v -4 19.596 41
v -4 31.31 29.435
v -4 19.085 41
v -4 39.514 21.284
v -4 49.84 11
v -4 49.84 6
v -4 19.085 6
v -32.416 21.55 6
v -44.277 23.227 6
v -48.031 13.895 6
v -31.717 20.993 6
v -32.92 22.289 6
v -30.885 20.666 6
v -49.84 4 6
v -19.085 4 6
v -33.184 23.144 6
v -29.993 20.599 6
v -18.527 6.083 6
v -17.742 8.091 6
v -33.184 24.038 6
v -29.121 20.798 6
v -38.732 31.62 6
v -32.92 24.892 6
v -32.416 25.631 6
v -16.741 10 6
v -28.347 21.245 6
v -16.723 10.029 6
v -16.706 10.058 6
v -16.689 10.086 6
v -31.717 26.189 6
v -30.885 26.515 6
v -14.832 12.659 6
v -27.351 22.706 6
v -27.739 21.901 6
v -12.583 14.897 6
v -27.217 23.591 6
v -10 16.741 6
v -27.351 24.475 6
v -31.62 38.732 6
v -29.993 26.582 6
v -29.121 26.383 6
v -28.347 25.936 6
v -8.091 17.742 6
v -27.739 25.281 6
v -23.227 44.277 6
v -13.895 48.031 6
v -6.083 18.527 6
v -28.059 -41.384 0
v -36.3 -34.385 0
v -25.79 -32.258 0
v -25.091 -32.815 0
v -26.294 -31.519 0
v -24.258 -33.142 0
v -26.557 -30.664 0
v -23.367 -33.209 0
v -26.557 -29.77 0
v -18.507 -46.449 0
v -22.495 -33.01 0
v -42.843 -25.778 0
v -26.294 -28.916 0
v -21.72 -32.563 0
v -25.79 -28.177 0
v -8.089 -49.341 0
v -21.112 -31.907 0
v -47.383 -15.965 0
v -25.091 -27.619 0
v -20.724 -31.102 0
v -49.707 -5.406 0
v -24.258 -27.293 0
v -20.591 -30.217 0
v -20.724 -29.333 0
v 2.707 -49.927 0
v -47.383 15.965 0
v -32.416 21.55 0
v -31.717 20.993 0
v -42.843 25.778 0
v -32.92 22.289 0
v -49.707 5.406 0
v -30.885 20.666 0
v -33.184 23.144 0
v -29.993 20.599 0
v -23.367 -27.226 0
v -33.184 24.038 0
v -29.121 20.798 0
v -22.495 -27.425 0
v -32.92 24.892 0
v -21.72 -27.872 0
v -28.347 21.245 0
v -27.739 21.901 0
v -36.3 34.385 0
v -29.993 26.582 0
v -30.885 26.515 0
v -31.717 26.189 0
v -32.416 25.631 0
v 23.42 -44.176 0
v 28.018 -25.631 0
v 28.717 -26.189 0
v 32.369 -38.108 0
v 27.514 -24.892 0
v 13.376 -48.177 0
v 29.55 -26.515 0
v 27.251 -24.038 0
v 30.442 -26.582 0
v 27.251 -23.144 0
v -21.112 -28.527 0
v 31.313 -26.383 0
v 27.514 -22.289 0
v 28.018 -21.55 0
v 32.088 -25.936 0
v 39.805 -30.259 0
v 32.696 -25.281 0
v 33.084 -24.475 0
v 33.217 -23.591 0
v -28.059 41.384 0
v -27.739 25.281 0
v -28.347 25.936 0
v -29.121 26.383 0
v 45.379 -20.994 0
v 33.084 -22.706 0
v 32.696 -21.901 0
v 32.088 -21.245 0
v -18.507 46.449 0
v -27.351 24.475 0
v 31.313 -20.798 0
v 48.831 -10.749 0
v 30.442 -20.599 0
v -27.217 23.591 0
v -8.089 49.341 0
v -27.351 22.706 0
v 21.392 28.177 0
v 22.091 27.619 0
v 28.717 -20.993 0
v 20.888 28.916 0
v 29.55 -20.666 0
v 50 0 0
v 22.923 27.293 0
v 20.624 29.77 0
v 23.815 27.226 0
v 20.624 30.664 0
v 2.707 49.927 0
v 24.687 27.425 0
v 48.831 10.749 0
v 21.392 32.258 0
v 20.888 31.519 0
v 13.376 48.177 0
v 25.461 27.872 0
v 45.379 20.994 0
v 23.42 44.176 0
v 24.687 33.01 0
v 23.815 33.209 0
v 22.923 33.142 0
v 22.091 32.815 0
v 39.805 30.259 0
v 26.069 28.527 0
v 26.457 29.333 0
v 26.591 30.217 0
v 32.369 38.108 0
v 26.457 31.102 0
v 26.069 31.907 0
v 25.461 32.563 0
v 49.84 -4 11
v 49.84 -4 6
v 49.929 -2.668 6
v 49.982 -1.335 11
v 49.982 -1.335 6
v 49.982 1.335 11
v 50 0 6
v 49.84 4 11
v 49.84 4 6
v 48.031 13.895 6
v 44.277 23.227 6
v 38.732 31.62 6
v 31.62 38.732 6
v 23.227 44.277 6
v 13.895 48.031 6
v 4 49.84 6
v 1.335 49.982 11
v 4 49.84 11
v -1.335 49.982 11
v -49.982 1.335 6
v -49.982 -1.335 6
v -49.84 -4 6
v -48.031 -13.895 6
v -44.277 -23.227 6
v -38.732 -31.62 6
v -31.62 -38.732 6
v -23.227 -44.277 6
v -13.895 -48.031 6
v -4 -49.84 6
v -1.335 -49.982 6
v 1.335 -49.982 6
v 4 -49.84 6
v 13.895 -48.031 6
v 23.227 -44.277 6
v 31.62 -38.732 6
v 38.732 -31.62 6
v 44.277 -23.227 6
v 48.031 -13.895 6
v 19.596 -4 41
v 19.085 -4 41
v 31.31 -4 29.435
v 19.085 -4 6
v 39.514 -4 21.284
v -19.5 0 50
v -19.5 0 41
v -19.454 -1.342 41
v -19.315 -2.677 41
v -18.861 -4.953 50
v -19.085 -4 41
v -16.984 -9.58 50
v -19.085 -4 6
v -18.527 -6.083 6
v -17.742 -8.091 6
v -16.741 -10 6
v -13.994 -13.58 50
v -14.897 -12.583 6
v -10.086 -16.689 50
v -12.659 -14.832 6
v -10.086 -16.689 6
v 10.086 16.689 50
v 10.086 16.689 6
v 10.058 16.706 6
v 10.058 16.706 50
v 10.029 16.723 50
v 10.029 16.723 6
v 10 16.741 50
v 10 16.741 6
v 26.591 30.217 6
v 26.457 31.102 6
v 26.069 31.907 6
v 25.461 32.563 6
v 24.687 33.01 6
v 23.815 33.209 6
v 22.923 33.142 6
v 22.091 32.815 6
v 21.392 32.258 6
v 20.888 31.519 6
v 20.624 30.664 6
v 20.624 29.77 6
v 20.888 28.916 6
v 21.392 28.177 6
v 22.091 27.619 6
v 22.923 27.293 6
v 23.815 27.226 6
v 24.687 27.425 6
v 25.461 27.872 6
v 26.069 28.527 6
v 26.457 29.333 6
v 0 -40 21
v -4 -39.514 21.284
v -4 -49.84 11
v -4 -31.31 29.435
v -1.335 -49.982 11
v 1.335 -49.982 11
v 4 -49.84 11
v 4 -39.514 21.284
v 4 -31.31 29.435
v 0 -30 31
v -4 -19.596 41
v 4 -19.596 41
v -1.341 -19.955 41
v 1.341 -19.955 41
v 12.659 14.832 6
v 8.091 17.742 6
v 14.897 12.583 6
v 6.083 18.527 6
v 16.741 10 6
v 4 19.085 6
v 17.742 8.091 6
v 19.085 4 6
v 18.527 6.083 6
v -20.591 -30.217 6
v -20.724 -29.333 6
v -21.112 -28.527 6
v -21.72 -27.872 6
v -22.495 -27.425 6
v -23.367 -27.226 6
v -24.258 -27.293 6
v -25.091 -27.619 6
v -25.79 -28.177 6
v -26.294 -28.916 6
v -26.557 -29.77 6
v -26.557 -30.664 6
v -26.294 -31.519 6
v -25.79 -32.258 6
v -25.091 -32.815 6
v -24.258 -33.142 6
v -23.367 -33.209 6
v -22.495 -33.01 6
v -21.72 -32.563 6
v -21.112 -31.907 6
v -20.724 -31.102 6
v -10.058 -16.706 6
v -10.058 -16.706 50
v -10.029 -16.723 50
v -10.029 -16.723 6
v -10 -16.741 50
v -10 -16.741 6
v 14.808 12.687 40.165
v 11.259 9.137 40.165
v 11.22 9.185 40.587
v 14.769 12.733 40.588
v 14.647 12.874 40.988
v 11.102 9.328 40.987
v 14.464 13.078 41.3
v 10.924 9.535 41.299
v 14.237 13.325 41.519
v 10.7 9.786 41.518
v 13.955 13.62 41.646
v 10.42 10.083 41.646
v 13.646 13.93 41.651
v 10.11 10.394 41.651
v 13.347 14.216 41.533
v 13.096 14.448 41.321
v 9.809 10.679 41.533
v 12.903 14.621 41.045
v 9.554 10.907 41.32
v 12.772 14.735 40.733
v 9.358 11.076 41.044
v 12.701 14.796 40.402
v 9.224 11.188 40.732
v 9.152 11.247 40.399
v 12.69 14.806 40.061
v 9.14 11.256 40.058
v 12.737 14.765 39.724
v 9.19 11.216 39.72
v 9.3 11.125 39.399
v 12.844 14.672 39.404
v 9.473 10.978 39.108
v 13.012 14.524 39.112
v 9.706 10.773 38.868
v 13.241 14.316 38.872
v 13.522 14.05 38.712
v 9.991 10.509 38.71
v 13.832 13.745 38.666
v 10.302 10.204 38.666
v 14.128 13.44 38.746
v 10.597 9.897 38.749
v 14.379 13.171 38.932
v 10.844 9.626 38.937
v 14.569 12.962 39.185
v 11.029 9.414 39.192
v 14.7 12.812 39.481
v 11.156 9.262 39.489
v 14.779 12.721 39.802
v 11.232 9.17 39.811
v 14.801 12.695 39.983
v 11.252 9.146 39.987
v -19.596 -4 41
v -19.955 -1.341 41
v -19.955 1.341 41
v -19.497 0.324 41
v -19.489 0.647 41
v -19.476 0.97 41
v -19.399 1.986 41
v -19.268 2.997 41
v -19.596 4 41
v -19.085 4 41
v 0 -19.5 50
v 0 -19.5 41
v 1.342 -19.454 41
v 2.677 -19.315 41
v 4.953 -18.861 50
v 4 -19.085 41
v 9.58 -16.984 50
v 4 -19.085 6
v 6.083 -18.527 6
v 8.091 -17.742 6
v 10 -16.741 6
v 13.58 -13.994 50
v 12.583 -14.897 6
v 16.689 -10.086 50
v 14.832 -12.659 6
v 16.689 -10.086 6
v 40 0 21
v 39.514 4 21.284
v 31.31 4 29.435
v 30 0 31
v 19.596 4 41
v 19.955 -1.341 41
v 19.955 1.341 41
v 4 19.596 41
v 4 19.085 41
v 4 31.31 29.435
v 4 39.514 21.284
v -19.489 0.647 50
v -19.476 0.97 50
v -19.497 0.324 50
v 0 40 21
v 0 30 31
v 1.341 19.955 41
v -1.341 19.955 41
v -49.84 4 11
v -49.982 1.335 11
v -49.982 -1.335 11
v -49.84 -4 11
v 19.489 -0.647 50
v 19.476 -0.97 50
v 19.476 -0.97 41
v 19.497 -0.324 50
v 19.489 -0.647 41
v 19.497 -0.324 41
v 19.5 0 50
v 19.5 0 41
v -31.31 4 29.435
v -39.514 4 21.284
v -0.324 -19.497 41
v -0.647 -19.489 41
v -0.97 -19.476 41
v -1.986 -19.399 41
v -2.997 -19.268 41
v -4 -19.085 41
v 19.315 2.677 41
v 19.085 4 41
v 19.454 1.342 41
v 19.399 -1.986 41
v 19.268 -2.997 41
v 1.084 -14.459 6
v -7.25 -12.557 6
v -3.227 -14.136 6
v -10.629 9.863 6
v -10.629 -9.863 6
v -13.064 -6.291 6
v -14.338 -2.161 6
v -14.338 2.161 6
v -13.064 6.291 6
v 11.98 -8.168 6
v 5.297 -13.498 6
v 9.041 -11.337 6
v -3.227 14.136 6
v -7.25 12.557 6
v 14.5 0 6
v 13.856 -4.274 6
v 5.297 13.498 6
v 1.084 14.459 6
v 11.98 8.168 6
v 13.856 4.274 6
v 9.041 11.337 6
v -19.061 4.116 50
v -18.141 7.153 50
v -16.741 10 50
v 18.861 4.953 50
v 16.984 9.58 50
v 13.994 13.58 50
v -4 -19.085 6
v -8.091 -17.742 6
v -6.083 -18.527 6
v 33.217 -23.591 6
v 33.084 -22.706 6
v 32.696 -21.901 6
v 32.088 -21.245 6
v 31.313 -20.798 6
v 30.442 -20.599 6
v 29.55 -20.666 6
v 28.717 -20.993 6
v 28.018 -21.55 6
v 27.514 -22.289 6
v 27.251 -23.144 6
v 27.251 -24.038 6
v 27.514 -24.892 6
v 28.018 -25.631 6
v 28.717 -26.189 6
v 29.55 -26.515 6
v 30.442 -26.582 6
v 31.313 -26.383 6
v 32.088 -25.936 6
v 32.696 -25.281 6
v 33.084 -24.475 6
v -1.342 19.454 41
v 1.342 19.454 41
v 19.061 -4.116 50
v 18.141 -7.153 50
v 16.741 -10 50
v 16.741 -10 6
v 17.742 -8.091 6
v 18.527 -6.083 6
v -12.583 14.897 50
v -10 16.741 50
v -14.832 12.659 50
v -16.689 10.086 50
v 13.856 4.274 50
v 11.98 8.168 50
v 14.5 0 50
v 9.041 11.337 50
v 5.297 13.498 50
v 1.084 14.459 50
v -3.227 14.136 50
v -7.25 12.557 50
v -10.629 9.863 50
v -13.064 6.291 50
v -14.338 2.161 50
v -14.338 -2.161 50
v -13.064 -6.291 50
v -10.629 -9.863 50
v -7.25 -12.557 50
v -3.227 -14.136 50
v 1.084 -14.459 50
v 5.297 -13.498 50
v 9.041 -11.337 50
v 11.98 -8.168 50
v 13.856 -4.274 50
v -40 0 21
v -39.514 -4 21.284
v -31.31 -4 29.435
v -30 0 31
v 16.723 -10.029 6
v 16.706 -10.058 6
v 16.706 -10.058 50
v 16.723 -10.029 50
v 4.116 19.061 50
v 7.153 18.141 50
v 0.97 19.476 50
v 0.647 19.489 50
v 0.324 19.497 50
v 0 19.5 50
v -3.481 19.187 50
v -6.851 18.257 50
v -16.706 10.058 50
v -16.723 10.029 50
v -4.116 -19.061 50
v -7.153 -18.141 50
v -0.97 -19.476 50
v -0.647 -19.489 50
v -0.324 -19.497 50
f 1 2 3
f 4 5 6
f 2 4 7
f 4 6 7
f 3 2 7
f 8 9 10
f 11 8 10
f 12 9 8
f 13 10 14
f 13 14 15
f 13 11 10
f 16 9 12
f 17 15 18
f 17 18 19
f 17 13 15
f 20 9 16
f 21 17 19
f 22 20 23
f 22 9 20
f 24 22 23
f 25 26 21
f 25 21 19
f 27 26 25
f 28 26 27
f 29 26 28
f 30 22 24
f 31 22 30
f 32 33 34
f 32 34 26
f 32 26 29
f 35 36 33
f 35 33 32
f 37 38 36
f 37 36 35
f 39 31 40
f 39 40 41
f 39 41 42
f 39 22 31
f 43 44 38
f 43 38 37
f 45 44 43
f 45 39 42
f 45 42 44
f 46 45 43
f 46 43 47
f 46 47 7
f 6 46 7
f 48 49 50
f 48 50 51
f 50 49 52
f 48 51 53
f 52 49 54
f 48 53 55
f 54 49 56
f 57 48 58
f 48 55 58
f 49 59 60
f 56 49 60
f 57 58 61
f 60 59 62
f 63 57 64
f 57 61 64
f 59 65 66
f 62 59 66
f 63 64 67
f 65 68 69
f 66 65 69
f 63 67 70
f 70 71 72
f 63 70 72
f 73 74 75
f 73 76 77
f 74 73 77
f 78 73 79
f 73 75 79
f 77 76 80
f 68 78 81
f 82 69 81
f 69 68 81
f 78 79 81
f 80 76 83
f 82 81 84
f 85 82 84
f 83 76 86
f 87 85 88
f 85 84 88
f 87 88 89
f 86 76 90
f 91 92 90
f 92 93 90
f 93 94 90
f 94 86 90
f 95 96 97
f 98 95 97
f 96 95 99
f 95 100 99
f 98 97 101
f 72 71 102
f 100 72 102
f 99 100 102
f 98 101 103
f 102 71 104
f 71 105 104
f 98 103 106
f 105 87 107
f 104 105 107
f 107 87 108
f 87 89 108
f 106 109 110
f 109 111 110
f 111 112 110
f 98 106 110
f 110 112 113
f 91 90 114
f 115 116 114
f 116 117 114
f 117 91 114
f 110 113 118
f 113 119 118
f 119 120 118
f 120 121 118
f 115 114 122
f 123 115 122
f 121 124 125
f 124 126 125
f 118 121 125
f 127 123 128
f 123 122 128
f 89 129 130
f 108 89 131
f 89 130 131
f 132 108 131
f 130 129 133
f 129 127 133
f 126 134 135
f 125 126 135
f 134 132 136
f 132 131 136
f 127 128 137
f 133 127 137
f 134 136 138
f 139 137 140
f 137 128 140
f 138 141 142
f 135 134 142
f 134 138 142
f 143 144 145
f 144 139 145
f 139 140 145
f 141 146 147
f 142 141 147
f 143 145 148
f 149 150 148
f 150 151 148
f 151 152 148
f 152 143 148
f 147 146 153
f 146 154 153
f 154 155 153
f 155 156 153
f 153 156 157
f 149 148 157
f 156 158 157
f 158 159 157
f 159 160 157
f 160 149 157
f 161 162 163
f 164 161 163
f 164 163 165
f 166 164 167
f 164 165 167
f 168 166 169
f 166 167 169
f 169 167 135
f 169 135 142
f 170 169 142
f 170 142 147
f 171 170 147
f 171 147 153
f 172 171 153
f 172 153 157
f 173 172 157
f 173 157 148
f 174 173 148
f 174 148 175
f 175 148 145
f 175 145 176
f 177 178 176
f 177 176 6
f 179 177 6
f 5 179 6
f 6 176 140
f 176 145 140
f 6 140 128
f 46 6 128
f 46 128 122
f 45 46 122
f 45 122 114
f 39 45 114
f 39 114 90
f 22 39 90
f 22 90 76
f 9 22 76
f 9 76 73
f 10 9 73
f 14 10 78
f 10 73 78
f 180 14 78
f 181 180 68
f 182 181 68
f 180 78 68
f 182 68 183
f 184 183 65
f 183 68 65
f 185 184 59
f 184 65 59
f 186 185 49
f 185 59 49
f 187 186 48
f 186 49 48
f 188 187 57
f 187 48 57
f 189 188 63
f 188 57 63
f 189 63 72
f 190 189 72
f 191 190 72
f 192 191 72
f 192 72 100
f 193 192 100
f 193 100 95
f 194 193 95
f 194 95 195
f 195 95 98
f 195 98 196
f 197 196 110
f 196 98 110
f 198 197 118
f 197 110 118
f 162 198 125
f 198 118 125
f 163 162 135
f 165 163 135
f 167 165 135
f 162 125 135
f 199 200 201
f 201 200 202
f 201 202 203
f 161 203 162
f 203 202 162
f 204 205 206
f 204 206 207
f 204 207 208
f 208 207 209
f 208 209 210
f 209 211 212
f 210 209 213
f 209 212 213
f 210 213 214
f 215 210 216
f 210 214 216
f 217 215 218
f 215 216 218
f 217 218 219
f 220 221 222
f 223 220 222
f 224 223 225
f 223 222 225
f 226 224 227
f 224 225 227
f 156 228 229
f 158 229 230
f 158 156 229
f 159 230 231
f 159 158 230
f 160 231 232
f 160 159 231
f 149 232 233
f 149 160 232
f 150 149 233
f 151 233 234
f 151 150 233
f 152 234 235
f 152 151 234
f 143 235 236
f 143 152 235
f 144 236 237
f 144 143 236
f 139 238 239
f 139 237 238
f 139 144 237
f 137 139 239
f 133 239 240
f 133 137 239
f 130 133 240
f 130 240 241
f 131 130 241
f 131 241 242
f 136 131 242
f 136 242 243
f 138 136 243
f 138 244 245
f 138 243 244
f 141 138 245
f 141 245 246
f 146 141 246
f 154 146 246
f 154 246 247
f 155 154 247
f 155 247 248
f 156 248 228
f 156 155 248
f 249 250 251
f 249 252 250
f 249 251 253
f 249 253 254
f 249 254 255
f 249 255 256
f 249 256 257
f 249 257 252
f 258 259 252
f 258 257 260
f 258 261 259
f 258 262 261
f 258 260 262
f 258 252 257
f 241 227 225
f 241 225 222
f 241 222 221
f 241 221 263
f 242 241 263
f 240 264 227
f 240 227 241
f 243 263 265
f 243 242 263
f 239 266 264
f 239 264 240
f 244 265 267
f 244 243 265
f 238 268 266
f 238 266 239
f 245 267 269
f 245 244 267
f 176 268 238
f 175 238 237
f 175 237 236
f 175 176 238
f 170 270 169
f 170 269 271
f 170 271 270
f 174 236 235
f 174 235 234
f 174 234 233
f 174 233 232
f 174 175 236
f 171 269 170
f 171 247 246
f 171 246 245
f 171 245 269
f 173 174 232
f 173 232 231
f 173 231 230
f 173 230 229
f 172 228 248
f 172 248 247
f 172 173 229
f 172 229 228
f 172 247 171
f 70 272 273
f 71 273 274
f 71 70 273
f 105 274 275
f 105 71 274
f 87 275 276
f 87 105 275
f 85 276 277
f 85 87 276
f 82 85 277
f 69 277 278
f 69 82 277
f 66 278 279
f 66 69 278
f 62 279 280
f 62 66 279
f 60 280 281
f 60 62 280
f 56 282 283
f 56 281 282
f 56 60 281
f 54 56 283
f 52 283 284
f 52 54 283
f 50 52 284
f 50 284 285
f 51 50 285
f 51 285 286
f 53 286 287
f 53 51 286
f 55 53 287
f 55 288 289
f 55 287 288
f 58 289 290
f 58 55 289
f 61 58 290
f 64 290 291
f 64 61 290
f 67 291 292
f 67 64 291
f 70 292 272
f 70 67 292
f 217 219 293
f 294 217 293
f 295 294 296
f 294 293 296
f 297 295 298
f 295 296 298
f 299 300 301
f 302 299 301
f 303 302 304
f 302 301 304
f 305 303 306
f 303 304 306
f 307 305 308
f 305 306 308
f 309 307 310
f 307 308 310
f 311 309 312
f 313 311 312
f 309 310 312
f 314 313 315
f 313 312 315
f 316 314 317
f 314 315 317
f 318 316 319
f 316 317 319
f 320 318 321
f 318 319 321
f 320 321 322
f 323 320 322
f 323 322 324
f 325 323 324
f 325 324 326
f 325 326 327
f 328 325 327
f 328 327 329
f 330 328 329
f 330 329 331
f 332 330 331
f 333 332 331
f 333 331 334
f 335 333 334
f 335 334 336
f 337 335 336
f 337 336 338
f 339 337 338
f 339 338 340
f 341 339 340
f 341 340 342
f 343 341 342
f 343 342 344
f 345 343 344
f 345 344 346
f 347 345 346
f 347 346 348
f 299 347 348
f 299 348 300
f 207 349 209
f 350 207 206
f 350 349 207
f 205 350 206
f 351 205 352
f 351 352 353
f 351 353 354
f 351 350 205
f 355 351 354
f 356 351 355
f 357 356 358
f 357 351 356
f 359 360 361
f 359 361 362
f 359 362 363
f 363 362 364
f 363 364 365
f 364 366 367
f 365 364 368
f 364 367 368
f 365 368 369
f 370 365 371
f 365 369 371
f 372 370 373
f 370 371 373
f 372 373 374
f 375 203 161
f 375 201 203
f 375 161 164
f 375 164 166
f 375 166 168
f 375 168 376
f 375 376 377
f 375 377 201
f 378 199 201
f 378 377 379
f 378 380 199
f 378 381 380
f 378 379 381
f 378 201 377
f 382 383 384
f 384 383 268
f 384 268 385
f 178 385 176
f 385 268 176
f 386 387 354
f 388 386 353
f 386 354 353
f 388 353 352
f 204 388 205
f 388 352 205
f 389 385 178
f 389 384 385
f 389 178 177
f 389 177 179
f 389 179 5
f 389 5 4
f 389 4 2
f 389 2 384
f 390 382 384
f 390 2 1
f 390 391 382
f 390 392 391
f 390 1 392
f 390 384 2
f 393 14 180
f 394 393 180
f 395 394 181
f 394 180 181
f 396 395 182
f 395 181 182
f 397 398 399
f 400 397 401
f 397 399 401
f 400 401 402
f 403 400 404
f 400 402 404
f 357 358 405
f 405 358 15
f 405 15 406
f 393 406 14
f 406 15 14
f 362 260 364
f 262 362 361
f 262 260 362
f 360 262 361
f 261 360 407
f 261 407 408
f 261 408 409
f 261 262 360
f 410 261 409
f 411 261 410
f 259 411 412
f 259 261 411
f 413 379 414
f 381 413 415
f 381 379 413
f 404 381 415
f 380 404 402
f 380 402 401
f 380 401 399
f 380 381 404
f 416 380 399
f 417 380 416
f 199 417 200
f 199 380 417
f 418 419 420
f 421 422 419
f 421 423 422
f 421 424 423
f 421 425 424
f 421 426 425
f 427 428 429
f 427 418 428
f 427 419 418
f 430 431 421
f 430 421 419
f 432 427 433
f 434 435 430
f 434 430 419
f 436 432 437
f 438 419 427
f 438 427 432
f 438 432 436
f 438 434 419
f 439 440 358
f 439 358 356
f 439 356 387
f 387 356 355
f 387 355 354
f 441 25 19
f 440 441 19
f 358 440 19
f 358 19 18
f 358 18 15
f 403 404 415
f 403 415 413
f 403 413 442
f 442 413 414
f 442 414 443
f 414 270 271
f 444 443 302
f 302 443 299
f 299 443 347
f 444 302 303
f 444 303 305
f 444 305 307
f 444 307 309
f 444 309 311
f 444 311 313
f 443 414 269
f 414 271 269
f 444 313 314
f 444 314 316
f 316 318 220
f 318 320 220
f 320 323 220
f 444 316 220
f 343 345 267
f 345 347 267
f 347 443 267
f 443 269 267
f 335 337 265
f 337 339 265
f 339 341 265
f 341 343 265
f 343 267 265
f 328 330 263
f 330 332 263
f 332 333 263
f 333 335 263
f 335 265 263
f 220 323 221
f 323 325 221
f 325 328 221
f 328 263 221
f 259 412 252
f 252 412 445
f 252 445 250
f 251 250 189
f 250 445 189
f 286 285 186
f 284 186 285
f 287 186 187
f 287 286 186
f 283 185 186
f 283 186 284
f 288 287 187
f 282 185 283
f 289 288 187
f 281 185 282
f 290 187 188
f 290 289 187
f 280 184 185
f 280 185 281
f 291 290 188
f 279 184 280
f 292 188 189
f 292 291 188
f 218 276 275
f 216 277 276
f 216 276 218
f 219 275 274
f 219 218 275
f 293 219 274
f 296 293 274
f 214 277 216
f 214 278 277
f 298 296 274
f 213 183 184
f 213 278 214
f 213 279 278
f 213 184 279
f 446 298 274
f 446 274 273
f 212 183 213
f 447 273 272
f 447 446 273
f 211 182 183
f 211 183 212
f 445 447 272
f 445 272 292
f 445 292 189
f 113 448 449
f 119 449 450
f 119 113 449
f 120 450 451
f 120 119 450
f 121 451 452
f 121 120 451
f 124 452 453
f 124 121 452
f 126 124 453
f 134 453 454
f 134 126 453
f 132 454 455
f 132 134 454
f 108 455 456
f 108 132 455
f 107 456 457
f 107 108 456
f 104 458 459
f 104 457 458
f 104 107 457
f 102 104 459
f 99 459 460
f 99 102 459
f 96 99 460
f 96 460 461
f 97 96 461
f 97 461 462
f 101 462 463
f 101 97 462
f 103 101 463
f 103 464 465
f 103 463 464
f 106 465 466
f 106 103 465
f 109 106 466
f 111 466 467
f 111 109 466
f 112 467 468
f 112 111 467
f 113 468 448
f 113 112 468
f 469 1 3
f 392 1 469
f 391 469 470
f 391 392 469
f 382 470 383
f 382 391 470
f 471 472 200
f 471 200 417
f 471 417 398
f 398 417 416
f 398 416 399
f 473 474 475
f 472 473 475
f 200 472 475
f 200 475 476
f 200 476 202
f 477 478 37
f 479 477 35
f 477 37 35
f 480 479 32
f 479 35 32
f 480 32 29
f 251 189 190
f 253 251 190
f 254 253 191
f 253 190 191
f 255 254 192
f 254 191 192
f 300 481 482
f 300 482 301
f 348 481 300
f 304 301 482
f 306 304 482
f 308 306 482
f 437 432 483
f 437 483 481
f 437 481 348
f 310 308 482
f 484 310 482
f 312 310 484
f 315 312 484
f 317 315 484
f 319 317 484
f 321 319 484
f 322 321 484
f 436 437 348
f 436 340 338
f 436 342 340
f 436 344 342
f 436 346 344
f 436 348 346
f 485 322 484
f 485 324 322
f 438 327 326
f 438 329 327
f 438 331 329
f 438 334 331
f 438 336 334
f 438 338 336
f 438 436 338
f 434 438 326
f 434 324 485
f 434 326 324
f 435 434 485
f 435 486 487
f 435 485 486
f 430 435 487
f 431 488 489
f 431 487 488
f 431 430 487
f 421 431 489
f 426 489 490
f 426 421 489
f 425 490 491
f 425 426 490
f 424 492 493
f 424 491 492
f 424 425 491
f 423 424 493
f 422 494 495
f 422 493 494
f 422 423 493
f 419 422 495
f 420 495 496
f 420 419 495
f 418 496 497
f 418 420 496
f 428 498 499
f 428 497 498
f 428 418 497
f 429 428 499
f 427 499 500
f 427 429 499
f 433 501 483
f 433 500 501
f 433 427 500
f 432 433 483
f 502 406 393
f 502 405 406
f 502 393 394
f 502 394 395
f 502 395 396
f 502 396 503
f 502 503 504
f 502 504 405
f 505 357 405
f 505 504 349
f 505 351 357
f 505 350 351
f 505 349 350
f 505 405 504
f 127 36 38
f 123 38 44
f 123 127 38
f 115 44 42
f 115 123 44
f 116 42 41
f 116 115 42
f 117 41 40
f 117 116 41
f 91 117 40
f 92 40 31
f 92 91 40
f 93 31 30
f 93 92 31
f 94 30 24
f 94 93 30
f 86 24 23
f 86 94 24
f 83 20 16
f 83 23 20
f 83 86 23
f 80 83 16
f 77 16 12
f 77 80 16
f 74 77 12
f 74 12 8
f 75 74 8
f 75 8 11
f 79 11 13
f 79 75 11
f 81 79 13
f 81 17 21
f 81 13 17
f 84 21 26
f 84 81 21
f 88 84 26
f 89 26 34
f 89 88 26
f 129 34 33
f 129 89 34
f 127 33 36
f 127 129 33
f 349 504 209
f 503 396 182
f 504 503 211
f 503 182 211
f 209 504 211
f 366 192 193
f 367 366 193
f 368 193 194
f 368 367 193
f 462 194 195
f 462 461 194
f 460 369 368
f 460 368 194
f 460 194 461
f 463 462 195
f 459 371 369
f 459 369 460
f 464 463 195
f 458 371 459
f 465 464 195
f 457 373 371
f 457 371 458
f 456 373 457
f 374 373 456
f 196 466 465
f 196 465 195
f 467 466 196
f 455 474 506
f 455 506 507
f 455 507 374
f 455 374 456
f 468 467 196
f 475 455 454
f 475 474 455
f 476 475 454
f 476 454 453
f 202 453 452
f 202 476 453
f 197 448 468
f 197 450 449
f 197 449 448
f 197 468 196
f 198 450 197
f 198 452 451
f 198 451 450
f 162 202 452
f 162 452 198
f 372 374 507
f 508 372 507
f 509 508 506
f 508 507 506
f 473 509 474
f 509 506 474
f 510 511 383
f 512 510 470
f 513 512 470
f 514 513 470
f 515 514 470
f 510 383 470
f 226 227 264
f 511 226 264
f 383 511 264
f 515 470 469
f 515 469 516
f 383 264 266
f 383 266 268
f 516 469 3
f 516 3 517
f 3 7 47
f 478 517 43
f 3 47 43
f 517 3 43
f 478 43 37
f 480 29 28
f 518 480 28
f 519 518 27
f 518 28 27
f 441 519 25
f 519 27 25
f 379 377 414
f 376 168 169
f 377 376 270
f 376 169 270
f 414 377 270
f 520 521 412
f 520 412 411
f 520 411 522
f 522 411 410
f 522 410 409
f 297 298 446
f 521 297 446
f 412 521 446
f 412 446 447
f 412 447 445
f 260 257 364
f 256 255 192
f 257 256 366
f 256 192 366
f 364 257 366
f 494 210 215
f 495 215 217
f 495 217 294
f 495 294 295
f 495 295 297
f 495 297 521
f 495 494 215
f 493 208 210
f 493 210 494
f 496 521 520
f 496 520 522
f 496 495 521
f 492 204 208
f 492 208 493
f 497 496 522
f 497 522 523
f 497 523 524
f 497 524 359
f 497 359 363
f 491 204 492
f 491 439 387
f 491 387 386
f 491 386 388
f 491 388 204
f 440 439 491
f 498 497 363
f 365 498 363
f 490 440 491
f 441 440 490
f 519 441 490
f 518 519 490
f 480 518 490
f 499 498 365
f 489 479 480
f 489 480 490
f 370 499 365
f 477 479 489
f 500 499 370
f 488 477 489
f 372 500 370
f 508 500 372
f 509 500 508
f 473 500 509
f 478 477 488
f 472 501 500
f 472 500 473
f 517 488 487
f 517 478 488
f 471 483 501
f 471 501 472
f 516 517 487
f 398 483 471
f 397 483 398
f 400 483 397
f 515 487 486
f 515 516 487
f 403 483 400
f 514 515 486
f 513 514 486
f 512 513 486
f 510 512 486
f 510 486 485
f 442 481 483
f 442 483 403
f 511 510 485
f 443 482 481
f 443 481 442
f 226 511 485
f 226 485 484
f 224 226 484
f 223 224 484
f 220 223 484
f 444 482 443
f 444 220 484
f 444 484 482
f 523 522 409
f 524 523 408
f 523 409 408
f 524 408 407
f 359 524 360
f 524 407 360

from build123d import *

# Parameters (mm, degrees)
F0_R      = 14.5
F1_DEPTH  = 50
F2_DEPTH  = 2
F3_R      = 50
F3_R_2    = 3
F4_DEPTH  = 6
F6_DEPTH  = 35
F7_SIZE   = 30
F8_COUNT  = 4
F10_R     = 1.5
F11_DEPTH = 30


with BuildPart() as f1:
    # F0 (on Top) → F1 (new body)
    with BuildSketch(Plane.XY):
        with BuildLine():
            ThreePointArc((19.475849062, -0.970207871), (19.4939613305, -0.4852542068), (19.5, 0))
            ThreePointArc((19.5, 0), (16.9843331812, 9.5803145245), (10.0864178063, 16.6887439862))
            ThreePointArc((10.0864178063, 16.6887439862), (10.0432424607, 16.7147623637), (10, 16.7406690428))
            ThreePointArc((10, 16.7406690428), (0, 19.5), (-10, 16.7406690428))
            ThreePointArc((-10, 16.7406690428), (-10.0432424607, -16.7147623637), (19.475849062, -0.970207871))
        make_face()
        Circle(F0_R, mode=Mode.SUBTRACT)
    extrude(amount=F1_DEPTH)

    # F0 (on Top) → F2 (join)
    with BuildSketch(Plane.XY):
        Circle(F0_R)
    extrude(amount=F2_DEPTH)

    # F3 (on Top) → F4 (join)
    with BuildSketch(Plane.XY):
        Circle(F3_R)
        with Locations((-23.5907118767, -30.2173215896)):
            Circle(F3_R_2, mode=Mode.SUBTRACT)
        with Locations((30.2173215896, -23.5907118767)):
            Circle(F3_R_2, mode=Mode.SUBTRACT)
        with Locations((-30.2173215896, 23.5907118767)):
            Circle(F3_R_2, mode=Mode.SUBTRACT)
        with Locations((23.5907118767, 30.2173215896)):
            Circle(F3_R_2, mode=Mode.SUBTRACT)
    extrude(amount=F4_DEPTH)

    # F5 (on face) → F6 (join)
    with BuildSketch(Plane.XY.offset(6)):
        with BuildLine():
            Line((4, 19.085334684), (4, 49.8397431775))
            ThreePointArc((4, 49.8397431775), (0, 50), (-4, 49.8397431775))
            Line((-4, 49.8397431775), (-4, 19.085334684))
            ThreePointArc((-4, 19.085334684), (0, 19.5), (4, 19.085334684))
        make_face()
    extrude(amount=F6_DEPTH)

    # F7
    f7_edges = [f1.edges().sort_by_distance(p)[0] for p in [
        (0, 50, 41),
    ]]
    chamfer(f7_edges, length=F7_SIZE)

    # F8: F1 ×4 about axis
    f8_axis = Axis((0, 0, 0), (0, 0, -1))


with BuildPart() as f1_1:
    add(f1.part)
    for i in range(1, F8_COUNT):
        add(f1.part.rotate(f8_axis, i * 360 / F8_COUNT))

    # F10 (on face) → F11 (cut)
    with BuildSketch(Plane(origin=(0, 0, 0), x_dir=(0.7071067812, -0.7071067812, 0), z_dir=(-0.7071067812, -0.7071067812, 0))):
        with Locations((0, 40.1646271348)):
            Circle(F10_R)
    extrude(amount=-F11_DEPTH, mode=Mode.SUBTRACT)


solid = f1_1.part
